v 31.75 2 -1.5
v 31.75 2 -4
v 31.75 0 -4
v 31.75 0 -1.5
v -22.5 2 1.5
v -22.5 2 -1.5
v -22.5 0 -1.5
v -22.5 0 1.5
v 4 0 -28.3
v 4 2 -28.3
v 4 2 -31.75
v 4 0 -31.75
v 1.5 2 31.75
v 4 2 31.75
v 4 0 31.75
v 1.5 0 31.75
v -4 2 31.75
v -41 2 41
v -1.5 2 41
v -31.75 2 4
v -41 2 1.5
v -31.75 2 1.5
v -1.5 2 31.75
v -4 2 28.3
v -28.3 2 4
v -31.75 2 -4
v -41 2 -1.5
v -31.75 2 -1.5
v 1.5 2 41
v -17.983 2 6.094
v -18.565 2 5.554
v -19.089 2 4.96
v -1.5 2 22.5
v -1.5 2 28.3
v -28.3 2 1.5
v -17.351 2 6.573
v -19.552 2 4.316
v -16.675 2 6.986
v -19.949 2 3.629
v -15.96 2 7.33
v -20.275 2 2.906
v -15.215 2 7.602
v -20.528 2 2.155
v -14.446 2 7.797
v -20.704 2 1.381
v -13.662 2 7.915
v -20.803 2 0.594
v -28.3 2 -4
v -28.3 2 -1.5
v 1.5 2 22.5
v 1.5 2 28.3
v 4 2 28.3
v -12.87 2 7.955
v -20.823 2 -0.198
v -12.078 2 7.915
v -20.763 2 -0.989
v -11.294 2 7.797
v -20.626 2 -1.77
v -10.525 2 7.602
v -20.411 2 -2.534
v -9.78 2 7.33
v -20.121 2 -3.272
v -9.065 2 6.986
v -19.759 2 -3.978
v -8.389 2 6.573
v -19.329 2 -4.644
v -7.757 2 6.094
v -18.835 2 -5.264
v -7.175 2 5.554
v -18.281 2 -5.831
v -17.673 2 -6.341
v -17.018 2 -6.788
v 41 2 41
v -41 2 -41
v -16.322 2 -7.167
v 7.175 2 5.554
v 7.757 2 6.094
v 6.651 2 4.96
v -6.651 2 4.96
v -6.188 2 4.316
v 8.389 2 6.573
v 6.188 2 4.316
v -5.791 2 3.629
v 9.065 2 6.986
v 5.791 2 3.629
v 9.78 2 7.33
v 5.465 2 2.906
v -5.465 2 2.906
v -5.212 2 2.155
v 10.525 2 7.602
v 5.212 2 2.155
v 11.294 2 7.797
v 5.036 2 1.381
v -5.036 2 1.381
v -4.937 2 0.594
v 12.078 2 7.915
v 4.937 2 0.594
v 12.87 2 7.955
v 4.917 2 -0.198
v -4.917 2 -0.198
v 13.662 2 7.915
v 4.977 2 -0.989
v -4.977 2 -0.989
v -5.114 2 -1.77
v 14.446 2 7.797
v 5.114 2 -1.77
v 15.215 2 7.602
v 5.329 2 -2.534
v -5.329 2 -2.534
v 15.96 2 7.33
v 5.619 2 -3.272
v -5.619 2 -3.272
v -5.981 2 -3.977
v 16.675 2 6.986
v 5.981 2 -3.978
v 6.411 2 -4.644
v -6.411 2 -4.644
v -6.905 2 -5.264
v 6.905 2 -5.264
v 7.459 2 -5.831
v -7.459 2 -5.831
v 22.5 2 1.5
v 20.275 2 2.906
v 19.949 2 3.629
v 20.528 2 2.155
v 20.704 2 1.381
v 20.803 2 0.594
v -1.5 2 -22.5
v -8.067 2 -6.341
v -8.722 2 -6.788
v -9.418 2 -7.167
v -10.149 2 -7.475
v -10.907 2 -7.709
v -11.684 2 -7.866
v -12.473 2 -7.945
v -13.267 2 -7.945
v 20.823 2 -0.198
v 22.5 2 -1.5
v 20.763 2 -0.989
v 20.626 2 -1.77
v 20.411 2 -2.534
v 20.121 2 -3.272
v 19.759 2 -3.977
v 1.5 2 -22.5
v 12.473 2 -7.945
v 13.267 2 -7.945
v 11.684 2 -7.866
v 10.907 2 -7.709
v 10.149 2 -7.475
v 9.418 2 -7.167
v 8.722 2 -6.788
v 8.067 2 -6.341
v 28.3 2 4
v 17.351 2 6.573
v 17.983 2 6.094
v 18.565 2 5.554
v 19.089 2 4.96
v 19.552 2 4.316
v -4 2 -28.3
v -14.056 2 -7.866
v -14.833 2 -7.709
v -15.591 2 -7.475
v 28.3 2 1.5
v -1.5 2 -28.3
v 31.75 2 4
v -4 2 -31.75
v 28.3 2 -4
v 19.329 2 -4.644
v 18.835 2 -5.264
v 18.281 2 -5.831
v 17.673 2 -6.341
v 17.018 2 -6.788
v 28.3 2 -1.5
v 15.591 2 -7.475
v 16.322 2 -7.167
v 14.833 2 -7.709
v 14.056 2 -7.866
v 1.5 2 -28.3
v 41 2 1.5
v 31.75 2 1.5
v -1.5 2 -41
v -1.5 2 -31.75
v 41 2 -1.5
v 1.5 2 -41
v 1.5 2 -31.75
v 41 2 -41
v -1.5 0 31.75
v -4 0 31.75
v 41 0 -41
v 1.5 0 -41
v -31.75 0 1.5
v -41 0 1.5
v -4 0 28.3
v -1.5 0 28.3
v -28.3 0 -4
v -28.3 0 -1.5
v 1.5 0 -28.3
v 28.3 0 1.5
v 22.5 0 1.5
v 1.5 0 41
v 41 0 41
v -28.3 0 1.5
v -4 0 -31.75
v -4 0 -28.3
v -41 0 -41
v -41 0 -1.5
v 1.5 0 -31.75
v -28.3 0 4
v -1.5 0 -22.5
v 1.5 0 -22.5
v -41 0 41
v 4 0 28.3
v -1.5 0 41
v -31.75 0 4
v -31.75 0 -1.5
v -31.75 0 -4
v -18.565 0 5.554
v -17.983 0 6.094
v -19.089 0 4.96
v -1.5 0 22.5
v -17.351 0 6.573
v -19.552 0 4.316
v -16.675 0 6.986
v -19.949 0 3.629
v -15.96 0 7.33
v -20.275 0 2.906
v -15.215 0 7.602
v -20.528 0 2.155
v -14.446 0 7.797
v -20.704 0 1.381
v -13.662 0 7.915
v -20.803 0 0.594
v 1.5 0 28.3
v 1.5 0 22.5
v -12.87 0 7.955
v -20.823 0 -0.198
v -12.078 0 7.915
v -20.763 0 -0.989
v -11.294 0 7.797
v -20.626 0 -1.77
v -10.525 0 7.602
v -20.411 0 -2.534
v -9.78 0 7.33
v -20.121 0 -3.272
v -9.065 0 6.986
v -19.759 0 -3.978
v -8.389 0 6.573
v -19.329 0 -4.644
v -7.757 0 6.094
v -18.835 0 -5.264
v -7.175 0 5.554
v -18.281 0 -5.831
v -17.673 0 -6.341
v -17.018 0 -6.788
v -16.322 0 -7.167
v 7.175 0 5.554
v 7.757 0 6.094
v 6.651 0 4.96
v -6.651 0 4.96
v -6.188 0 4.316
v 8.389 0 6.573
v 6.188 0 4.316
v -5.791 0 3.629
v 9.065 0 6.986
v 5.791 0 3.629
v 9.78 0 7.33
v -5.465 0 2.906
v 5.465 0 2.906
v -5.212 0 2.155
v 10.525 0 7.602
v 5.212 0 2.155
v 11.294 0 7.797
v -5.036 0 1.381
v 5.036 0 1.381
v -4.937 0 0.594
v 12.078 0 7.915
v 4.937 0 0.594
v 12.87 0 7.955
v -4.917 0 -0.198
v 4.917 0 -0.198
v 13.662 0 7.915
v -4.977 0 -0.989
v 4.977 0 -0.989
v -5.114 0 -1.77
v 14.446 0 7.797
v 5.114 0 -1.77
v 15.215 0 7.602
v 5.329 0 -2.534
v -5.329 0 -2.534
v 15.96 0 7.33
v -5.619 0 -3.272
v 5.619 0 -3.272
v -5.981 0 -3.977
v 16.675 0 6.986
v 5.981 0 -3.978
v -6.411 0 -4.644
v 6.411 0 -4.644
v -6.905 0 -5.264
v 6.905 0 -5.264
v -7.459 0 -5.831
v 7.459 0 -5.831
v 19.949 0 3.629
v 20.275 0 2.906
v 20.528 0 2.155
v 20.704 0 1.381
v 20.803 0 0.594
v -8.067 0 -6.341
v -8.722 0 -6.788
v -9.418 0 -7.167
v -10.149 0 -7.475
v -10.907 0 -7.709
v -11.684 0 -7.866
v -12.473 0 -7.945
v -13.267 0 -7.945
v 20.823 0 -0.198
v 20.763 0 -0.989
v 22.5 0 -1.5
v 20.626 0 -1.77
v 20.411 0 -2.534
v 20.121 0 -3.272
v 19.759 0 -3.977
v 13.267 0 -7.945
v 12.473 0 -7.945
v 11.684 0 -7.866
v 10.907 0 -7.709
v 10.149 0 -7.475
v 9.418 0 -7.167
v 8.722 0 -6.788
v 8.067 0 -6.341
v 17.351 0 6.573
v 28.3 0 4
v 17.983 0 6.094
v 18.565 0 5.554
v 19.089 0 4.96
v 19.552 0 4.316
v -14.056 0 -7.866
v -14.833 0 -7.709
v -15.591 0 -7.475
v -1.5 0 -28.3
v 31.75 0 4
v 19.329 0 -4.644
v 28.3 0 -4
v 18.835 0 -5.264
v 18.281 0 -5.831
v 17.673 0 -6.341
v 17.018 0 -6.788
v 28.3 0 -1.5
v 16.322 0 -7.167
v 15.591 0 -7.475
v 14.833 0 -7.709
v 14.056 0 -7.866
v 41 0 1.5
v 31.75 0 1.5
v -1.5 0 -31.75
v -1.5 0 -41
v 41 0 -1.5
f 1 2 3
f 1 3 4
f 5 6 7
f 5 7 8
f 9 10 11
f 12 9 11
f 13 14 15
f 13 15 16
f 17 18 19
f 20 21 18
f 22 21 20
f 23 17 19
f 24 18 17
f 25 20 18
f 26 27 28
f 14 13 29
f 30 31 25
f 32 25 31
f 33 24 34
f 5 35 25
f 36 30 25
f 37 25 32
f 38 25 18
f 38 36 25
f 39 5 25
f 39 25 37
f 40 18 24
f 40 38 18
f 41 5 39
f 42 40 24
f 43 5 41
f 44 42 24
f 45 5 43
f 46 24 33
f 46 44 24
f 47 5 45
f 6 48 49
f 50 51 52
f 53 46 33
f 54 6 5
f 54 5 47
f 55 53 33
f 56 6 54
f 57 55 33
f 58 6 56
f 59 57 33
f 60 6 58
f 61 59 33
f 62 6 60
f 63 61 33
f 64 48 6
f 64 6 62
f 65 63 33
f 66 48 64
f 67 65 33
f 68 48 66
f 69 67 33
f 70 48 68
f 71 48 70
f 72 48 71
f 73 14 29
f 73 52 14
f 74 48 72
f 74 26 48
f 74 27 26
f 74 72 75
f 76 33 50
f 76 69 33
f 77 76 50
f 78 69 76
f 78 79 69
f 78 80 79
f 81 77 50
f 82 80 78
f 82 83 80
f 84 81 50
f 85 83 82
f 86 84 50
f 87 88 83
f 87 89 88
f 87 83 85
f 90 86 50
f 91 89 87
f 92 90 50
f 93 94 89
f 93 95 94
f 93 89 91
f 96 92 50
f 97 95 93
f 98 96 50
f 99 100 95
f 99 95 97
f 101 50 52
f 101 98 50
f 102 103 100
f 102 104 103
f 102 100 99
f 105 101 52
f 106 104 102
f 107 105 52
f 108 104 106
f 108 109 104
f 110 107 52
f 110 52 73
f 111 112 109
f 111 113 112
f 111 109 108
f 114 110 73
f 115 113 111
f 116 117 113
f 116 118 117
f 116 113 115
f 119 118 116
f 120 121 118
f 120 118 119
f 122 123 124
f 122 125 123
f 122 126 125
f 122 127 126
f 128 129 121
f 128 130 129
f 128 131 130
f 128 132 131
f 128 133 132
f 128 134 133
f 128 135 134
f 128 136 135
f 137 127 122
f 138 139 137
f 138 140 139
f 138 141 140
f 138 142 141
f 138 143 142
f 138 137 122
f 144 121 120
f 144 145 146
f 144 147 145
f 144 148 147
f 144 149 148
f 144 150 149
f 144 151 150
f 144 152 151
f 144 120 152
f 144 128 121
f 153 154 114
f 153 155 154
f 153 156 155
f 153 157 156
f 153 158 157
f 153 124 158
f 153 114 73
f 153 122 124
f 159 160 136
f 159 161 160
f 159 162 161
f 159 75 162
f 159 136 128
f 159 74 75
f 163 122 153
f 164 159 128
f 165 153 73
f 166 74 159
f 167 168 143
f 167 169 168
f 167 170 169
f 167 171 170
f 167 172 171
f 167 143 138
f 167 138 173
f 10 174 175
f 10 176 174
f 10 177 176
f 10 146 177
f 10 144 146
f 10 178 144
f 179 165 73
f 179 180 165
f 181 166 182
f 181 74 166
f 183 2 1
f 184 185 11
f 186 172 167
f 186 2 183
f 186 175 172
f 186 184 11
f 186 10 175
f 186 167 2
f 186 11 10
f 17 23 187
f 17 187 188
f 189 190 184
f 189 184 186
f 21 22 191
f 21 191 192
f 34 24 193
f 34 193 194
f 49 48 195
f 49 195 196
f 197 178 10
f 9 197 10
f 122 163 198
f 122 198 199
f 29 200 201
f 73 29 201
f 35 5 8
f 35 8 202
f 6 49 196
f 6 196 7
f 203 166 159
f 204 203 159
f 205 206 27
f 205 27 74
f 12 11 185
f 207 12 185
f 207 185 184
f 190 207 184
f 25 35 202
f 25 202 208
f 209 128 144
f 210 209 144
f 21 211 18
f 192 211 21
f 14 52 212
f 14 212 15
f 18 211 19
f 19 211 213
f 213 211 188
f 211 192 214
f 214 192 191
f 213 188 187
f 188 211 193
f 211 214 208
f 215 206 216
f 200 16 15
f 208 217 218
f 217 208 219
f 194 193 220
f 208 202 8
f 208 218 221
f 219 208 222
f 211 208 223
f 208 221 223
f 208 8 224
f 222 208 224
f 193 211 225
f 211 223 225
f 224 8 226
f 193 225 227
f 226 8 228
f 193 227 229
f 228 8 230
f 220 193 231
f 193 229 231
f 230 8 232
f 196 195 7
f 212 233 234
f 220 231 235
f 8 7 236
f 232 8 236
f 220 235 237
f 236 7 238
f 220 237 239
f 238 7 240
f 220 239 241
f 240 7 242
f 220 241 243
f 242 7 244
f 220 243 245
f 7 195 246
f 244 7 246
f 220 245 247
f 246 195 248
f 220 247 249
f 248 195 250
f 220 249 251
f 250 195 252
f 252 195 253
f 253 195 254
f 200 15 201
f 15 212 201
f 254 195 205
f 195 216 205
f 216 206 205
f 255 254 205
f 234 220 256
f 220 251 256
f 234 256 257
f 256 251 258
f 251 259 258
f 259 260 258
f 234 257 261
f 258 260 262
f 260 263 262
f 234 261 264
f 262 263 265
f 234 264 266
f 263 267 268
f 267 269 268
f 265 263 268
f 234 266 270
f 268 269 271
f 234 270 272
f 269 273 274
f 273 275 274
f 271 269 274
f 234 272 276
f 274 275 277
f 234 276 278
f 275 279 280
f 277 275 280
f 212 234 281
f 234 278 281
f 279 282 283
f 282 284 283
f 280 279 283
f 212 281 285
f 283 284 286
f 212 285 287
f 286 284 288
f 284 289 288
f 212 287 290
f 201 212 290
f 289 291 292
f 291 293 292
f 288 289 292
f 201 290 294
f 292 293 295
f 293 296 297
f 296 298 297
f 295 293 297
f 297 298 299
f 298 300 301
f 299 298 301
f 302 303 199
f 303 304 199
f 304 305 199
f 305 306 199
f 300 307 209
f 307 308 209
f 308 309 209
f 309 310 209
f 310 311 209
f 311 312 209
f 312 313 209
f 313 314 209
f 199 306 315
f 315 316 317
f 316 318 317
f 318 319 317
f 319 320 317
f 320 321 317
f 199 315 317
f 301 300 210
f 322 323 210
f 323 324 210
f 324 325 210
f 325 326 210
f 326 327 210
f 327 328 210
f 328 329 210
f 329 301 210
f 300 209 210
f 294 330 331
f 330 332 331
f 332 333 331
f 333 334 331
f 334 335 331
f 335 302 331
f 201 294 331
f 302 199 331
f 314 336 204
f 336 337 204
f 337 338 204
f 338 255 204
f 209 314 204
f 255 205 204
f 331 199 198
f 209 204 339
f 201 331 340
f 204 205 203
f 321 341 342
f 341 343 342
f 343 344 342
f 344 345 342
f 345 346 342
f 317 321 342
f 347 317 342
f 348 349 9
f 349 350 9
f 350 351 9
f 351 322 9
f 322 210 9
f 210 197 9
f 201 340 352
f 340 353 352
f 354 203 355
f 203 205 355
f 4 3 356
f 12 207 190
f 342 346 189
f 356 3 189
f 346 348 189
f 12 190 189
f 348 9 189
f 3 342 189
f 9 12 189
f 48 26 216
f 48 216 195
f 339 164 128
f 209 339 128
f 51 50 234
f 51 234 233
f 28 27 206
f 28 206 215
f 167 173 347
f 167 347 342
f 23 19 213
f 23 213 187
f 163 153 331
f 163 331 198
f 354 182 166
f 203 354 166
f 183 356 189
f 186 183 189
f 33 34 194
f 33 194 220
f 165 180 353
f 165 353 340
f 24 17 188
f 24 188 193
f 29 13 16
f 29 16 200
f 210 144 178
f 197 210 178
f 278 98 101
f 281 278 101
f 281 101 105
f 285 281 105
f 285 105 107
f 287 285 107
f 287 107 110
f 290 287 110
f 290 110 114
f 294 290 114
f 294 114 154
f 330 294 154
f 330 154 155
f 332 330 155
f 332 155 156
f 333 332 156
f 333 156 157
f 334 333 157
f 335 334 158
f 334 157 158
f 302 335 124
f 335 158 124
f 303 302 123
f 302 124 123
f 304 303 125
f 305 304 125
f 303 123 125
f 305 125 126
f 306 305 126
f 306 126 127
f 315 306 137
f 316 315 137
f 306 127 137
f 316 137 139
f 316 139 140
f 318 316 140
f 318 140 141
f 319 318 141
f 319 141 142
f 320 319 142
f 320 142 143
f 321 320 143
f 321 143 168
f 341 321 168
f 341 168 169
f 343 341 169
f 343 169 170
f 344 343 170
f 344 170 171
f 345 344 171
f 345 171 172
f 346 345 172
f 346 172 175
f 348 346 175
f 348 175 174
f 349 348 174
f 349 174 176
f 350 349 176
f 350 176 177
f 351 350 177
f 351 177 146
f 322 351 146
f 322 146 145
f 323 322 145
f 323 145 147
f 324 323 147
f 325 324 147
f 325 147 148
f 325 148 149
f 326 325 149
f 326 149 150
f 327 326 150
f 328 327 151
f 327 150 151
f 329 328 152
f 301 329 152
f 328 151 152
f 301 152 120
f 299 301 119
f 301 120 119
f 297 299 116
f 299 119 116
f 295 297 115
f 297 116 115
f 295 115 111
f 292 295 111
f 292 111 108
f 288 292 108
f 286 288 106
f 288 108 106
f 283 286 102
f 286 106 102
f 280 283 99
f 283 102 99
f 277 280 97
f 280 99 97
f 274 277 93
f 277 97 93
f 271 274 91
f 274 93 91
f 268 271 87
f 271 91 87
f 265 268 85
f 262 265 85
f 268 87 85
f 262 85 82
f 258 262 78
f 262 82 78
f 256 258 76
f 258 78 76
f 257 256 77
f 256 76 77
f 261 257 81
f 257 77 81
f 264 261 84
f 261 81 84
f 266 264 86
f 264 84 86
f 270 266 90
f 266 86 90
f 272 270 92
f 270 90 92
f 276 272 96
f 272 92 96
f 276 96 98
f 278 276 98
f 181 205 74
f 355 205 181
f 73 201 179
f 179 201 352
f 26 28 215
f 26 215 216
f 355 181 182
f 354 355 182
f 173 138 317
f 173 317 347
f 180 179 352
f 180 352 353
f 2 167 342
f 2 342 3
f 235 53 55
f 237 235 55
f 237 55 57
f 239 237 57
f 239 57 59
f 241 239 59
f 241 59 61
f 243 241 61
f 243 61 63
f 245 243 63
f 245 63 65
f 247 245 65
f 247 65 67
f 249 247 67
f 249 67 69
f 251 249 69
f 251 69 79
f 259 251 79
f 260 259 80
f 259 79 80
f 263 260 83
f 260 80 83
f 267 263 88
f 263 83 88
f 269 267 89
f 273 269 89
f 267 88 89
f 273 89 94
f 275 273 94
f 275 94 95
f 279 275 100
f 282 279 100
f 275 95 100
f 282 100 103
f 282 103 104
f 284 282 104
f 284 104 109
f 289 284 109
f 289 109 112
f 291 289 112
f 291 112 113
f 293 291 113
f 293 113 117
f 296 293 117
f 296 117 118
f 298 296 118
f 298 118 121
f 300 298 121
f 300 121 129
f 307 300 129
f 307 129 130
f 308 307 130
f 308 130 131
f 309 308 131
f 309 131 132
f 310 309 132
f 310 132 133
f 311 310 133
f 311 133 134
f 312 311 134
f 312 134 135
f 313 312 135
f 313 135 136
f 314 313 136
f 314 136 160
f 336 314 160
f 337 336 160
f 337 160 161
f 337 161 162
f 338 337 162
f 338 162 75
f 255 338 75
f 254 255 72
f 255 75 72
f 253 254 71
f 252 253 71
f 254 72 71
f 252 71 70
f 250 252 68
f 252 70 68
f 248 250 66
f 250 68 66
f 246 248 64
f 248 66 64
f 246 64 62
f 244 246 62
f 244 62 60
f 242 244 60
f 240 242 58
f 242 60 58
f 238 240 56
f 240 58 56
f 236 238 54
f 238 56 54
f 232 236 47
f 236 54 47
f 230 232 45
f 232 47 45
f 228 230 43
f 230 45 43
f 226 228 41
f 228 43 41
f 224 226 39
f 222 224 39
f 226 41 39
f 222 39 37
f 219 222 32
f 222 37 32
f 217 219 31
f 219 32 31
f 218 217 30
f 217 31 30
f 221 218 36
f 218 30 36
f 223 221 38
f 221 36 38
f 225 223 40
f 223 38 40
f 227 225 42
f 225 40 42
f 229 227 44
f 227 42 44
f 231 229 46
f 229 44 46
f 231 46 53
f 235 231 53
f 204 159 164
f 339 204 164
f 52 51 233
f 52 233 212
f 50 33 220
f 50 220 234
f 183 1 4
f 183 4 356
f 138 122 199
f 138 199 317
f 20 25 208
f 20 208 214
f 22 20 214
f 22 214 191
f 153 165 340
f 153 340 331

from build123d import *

# Parameters (mm, degrees)
SKETCH1_W           = 82
SKETCH1_H           = 82
BOSS_EXTRUDE1_DEPTH = 2
SKETCH2_R           = 7.955
CUT_EXTRUDE1_DEPTH  = 10
CUT_EXTRUDE4_DEPTH  = 10


with BuildPart() as part:
    # Sketch1 → Boss-Extrude1 (new body)
    with BuildSketch(Plane(origin=(0, 0, 0), x_dir=(1, 0, 0), z_dir=(0, 1, 0))):
        Rectangle(SKETCH1_W, SKETCH1_H)
    extrude(amount=BOSS_EXTRUDE1_DEPTH)

    # Sketch2 → Cut-Extrude1 (cut)
    with BuildSketch(Plane(origin=(0, 2, 0), x_dir=(1, 0, 0), z_dir=(0, 1, 0))):
        with Locations(Location((-12.87, 0, 0), (0, 0, 270))):
            Circle(SKETCH2_R)
        with Locations(Location((12.87, 0, 0), (0, 0, 270))):
            Circle(SKETCH2_R)
    extrude(amount=-CUT_EXTRUDE1_DEPTH, mode=Mode.SUBTRACT)

    # Sketch6 → Cut-Extrude4 (cut)
    with BuildSketch(Plane(origin=(0, 2, 0), x_dir=(1, 0, 0), z_dir=(0, 1, 0))):
        Polygon((-1.5, 22.5), (1.5, 22.5), (1.5, 28.3), (4, 28.3), (4, 31.75), (1.5, 31.75), (1.5, 41), (-1.5, 41), (-1.5, 31.75), (-4, 31.75), (-4, 28.3), (-1.5, 28.3), align=None)
        Polygon((28.3, 1.5), (28.3, 4), (31.75, 4), (31.75, 1.5), (41, 1.5), (41, -1.5), (31.75, -1.5), (31.75, -4), (28.3, -4), (28.3, -1.5), (22.5, -1.5), (22.5, 1.5), align=None)
        Polygon((1.5, -28.3), (4, -28.3), (4, -31.75), (1.5, -31.75), (1.5, -41), (-1.5, -41), (-1.5, -31.75), (-4, -31.75), (-4, -28.3), (-1.5, -28.3), (-1.5, -22.5), (1.5, -22.5), align=None)
        Polygon((-28.3, -1.5), (-28.3, -4), (-31.75, -4), (-31.75, -1.5), (-41, -1.5), (-41, 1.5), (-31.75, 1.5), (-31.75, 4), (-28.3, 4), (-28.3, 1.5), (-22.5, 1.5), (-22.5, -1.5), align=None)
    extrude(amount=-CUT_EXTRUDE4_DEPTH, mode=Mode.SUBTRACT)


solid = part.part
